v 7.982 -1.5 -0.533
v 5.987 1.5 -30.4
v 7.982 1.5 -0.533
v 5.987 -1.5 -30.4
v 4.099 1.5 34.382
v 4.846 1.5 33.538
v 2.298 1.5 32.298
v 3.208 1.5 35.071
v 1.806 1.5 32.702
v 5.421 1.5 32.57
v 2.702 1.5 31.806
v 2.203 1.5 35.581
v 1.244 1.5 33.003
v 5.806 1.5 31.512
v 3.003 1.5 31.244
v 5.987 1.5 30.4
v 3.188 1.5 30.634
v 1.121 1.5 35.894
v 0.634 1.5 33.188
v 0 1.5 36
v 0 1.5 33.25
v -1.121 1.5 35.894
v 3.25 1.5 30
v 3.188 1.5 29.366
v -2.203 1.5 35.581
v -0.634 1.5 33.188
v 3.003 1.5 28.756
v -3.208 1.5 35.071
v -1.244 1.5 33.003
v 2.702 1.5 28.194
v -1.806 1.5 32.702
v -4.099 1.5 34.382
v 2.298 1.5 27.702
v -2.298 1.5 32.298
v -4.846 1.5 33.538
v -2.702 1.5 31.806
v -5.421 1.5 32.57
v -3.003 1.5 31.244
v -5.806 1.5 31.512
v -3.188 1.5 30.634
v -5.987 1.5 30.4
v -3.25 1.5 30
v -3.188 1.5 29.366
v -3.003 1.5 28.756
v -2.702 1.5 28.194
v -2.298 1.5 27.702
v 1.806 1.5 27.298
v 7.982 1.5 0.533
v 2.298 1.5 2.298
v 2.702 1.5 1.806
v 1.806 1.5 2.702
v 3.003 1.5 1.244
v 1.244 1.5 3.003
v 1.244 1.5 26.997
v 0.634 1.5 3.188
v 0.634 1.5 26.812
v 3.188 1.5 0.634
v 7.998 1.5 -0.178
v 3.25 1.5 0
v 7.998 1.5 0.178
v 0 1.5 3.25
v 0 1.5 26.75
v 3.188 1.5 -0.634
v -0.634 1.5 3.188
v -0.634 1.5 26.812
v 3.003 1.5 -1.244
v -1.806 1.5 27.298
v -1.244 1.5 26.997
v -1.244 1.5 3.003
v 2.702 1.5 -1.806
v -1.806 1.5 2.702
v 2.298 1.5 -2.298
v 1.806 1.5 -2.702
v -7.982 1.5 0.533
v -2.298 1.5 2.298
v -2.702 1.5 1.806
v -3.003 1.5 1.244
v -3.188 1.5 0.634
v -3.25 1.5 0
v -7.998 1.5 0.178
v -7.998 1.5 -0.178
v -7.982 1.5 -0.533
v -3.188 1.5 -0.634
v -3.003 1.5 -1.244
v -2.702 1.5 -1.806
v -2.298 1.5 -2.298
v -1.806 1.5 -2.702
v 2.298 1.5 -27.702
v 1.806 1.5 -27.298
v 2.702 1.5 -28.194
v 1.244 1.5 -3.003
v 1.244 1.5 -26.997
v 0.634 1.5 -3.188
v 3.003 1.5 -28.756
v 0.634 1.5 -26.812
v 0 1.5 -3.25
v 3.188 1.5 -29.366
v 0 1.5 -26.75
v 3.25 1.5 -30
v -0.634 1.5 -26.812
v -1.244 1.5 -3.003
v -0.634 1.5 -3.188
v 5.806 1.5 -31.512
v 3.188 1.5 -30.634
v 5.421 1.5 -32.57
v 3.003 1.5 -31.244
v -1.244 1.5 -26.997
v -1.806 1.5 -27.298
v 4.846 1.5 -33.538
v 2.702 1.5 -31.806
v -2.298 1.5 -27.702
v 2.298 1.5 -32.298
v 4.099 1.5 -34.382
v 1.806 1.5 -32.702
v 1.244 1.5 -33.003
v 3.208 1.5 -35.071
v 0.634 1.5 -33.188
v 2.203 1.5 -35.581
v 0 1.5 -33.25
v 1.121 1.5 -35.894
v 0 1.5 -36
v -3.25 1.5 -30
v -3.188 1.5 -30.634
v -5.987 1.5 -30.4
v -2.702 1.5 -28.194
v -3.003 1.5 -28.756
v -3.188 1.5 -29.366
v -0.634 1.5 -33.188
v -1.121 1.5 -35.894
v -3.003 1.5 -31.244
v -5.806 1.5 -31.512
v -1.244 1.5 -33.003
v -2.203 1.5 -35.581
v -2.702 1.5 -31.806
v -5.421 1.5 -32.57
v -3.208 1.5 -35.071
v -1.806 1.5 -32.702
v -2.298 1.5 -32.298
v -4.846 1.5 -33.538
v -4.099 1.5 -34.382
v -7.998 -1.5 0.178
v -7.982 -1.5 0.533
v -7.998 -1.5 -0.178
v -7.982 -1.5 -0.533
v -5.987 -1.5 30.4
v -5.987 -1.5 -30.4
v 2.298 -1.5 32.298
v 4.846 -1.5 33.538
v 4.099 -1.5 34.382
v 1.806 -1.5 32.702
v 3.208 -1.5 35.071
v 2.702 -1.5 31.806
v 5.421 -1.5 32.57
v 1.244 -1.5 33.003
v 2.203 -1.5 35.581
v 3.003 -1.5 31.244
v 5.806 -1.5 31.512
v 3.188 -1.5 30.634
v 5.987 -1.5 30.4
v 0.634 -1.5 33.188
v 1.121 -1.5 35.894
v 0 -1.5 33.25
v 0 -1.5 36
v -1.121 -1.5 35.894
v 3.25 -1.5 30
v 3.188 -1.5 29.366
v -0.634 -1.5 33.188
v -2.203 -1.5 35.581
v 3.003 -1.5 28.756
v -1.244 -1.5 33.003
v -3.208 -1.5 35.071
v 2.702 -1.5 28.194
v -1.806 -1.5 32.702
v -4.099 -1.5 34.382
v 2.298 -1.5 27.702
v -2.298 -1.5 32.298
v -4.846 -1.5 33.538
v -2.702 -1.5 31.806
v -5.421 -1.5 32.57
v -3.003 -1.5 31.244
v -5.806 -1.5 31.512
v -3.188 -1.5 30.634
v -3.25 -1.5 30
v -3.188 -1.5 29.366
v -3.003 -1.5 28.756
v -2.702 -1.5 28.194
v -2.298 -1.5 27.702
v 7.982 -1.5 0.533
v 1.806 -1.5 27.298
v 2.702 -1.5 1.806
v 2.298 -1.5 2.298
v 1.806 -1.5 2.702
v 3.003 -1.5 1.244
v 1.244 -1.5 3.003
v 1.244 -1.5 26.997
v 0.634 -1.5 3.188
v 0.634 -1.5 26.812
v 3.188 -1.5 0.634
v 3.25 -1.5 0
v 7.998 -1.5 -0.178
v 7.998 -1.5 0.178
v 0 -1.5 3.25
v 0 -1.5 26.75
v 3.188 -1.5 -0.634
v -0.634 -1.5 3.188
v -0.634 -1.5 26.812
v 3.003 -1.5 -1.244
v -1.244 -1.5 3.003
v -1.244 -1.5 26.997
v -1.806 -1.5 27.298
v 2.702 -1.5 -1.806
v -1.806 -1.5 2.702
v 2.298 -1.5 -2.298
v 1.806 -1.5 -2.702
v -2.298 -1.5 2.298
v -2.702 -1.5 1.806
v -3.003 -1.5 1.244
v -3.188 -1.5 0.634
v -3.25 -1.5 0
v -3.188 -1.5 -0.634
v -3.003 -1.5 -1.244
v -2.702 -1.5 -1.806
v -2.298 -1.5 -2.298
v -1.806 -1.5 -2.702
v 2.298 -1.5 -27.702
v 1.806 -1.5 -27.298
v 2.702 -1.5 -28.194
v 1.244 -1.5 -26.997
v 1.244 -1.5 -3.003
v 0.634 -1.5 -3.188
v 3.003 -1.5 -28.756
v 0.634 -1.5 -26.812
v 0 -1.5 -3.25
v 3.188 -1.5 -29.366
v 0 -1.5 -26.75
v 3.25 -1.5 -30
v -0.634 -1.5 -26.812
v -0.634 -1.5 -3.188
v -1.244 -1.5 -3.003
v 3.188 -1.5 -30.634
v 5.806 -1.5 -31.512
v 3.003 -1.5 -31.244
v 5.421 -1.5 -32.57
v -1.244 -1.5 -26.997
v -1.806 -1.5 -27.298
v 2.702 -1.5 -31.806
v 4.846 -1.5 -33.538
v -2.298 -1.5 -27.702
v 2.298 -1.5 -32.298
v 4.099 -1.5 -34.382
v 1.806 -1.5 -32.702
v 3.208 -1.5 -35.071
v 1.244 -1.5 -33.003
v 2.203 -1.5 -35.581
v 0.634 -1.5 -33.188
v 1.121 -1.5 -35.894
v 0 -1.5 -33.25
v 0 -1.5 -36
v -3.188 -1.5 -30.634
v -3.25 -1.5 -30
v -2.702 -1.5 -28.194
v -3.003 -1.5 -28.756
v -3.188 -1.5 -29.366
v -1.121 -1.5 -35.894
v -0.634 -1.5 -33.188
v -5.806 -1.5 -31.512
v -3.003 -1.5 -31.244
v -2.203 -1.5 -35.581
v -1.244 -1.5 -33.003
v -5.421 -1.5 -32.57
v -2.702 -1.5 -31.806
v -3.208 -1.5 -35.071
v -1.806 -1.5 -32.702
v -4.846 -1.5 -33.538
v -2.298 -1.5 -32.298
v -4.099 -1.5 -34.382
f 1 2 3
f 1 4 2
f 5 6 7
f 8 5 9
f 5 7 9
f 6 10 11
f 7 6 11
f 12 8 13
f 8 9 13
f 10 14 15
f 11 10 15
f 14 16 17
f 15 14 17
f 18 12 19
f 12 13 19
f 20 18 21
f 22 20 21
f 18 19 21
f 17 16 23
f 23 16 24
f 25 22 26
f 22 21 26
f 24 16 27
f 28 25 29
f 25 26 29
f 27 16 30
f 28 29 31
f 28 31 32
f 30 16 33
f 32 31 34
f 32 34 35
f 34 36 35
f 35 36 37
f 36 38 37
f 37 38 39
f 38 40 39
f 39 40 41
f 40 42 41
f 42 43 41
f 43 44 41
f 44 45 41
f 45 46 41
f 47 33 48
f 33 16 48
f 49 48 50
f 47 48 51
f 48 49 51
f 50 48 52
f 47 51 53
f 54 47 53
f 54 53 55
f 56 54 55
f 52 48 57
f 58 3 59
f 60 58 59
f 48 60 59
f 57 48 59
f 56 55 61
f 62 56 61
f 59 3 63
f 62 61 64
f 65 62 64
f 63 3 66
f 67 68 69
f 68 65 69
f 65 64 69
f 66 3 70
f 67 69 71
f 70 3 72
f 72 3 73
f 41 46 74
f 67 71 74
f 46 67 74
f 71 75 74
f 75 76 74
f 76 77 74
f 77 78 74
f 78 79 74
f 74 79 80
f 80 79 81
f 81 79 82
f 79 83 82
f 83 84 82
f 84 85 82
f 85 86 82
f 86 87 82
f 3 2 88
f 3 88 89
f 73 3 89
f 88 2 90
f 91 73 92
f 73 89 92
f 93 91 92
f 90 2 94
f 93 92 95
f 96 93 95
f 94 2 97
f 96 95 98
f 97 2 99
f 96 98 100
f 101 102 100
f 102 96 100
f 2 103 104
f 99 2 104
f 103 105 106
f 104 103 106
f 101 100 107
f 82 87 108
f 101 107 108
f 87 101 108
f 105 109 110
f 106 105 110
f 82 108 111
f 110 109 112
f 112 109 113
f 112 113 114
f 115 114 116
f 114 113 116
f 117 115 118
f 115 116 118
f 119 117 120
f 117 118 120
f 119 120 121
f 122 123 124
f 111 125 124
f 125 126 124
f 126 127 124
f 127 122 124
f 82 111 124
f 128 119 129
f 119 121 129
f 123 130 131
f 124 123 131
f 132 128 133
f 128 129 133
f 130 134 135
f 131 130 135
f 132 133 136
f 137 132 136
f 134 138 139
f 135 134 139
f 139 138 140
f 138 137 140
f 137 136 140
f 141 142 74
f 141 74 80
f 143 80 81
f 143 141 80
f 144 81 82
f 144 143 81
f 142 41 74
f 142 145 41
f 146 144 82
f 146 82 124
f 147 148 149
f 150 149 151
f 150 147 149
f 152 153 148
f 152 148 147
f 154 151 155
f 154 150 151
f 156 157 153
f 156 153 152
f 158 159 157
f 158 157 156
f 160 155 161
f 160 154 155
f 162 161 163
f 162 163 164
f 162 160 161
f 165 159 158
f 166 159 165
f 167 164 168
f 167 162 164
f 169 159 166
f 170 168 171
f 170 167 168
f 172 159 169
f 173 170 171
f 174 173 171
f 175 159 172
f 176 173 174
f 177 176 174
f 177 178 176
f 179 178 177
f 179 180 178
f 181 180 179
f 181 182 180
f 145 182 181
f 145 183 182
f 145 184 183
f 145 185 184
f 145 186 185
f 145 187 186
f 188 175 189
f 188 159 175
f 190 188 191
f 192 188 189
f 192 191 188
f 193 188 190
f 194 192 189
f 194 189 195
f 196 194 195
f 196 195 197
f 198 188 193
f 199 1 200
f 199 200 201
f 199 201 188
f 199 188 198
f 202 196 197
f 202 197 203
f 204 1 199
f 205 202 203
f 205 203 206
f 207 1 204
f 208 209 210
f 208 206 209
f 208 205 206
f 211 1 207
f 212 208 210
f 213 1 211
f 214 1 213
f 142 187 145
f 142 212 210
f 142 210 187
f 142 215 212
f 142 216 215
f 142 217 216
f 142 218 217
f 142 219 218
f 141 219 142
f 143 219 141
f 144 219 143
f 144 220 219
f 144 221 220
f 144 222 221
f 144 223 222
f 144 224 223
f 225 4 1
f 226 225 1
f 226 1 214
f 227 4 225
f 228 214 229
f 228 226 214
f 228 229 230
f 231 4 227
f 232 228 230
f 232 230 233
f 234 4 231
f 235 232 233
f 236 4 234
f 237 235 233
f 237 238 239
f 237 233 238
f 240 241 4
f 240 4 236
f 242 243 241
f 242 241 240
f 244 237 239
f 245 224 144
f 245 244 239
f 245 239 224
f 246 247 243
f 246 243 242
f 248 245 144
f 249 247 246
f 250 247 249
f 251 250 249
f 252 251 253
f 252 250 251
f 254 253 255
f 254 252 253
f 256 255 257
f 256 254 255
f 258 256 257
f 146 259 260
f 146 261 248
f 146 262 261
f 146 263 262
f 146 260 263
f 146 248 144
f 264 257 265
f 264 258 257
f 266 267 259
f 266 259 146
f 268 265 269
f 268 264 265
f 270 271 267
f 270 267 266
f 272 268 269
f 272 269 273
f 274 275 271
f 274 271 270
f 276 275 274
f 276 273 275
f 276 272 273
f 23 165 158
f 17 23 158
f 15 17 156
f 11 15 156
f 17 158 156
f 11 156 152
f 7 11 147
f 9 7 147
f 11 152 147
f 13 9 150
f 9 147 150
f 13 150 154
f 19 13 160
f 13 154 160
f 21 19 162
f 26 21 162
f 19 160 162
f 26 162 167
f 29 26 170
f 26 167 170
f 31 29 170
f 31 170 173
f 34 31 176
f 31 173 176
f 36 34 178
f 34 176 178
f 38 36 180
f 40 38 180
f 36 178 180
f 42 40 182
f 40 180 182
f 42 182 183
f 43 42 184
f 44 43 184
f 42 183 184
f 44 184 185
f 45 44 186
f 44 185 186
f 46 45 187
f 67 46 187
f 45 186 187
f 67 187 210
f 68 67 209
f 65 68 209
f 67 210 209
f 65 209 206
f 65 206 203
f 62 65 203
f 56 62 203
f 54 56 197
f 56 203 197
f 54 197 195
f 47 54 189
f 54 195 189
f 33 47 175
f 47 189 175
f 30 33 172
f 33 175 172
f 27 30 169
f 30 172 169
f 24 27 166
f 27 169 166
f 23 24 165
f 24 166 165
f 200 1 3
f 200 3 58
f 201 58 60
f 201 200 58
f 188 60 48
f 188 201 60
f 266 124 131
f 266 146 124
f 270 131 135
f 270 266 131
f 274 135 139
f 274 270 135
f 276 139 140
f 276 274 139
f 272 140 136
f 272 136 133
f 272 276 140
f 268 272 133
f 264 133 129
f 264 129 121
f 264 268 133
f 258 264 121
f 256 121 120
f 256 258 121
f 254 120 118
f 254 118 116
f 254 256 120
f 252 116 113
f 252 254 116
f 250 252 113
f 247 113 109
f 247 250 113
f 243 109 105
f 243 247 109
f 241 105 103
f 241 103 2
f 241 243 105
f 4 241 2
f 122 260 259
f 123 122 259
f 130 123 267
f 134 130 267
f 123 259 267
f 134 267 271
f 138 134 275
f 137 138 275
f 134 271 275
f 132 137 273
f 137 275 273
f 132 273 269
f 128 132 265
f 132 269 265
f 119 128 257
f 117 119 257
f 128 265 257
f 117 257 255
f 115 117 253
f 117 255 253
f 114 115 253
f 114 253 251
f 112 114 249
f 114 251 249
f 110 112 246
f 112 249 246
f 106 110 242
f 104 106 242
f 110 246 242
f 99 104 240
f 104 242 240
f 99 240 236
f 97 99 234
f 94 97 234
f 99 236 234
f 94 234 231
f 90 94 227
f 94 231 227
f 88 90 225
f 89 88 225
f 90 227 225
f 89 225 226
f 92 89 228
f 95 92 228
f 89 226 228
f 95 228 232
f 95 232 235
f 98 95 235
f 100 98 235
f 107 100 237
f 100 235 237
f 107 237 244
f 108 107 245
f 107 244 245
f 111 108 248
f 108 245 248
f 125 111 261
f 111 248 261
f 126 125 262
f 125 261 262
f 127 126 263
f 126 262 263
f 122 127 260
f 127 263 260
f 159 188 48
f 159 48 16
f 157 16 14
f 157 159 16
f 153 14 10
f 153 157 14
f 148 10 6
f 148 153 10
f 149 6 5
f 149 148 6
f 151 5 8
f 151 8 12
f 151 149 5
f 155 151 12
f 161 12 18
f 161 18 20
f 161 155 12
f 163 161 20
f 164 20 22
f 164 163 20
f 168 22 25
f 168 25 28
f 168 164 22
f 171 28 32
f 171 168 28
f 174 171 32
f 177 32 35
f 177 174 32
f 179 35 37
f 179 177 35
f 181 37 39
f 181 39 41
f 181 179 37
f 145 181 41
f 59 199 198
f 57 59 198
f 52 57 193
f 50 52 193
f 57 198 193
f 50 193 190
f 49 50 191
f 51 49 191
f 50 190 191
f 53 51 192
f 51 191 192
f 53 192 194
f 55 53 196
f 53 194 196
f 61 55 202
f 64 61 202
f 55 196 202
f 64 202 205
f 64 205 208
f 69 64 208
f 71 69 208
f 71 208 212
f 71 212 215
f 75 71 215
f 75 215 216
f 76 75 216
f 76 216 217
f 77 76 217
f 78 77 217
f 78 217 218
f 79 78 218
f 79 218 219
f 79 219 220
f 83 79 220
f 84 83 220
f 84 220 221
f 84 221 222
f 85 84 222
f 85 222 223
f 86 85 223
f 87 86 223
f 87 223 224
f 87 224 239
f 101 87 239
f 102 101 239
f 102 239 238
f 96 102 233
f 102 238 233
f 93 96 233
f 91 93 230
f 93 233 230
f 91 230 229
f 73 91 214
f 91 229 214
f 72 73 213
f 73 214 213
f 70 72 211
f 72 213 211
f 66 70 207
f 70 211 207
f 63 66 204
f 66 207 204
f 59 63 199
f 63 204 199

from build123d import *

# Parameters (mm, degrees)
F3_DEPTH = 1.5
F4_R     = 3.25
F5_DEPTH = 3
F6_COUNT = 2
F7_R     = 3.25
F8_DEPTH = 25


with BuildPart() as f3:
    # F2 (on Front) → F3 (new body, symmetric)
    with BuildSketch(Plane.XZ):
        with BuildLine():
            Line((-5.9866518188, 30.4), (-7.9822024251, 0.5333333333))
            ThreePointArc((-7.9822024251, 0.5333333333), (0, -8), (7.9822024251, 0.5333333333))
            Line((7.9822024251, 0.5333333333), (5.9866518188, 30.4))
            ThreePointArc((5.9866518188, 30.4), (0, 36), (-5.9866518188, 30.4))
        make_face()
    extrude(amount=F3_DEPTH, both=True)

    # F4 (on face) → F5 (cut, through all)
    with BuildSketch(Plane.XZ.offset(1.5)):
        with Locations((0, 30)):
            Circle(F4_R)
    extrude(amount=-F5_DEPTH, mode=Mode.SUBTRACT)

    # F6: F3 ×2 about axis
    f6_axis = Axis((0, 0, 0), (0, -1, 0))


with BuildPart() as f3_1:
    add(f3.part)
    for i in range(1, F6_COUNT):
        add(f3.part.rotate(f6_axis, i * 360 / F6_COUNT))

    # F7 (on face) → F8 (cut)
    with BuildSketch(Plane.XZ.offset(1.5)):
        Circle(F7_R)
    extrude(amount=-F8_DEPTH, mode=Mode.SUBTRACT)


solid = f3_1.part
